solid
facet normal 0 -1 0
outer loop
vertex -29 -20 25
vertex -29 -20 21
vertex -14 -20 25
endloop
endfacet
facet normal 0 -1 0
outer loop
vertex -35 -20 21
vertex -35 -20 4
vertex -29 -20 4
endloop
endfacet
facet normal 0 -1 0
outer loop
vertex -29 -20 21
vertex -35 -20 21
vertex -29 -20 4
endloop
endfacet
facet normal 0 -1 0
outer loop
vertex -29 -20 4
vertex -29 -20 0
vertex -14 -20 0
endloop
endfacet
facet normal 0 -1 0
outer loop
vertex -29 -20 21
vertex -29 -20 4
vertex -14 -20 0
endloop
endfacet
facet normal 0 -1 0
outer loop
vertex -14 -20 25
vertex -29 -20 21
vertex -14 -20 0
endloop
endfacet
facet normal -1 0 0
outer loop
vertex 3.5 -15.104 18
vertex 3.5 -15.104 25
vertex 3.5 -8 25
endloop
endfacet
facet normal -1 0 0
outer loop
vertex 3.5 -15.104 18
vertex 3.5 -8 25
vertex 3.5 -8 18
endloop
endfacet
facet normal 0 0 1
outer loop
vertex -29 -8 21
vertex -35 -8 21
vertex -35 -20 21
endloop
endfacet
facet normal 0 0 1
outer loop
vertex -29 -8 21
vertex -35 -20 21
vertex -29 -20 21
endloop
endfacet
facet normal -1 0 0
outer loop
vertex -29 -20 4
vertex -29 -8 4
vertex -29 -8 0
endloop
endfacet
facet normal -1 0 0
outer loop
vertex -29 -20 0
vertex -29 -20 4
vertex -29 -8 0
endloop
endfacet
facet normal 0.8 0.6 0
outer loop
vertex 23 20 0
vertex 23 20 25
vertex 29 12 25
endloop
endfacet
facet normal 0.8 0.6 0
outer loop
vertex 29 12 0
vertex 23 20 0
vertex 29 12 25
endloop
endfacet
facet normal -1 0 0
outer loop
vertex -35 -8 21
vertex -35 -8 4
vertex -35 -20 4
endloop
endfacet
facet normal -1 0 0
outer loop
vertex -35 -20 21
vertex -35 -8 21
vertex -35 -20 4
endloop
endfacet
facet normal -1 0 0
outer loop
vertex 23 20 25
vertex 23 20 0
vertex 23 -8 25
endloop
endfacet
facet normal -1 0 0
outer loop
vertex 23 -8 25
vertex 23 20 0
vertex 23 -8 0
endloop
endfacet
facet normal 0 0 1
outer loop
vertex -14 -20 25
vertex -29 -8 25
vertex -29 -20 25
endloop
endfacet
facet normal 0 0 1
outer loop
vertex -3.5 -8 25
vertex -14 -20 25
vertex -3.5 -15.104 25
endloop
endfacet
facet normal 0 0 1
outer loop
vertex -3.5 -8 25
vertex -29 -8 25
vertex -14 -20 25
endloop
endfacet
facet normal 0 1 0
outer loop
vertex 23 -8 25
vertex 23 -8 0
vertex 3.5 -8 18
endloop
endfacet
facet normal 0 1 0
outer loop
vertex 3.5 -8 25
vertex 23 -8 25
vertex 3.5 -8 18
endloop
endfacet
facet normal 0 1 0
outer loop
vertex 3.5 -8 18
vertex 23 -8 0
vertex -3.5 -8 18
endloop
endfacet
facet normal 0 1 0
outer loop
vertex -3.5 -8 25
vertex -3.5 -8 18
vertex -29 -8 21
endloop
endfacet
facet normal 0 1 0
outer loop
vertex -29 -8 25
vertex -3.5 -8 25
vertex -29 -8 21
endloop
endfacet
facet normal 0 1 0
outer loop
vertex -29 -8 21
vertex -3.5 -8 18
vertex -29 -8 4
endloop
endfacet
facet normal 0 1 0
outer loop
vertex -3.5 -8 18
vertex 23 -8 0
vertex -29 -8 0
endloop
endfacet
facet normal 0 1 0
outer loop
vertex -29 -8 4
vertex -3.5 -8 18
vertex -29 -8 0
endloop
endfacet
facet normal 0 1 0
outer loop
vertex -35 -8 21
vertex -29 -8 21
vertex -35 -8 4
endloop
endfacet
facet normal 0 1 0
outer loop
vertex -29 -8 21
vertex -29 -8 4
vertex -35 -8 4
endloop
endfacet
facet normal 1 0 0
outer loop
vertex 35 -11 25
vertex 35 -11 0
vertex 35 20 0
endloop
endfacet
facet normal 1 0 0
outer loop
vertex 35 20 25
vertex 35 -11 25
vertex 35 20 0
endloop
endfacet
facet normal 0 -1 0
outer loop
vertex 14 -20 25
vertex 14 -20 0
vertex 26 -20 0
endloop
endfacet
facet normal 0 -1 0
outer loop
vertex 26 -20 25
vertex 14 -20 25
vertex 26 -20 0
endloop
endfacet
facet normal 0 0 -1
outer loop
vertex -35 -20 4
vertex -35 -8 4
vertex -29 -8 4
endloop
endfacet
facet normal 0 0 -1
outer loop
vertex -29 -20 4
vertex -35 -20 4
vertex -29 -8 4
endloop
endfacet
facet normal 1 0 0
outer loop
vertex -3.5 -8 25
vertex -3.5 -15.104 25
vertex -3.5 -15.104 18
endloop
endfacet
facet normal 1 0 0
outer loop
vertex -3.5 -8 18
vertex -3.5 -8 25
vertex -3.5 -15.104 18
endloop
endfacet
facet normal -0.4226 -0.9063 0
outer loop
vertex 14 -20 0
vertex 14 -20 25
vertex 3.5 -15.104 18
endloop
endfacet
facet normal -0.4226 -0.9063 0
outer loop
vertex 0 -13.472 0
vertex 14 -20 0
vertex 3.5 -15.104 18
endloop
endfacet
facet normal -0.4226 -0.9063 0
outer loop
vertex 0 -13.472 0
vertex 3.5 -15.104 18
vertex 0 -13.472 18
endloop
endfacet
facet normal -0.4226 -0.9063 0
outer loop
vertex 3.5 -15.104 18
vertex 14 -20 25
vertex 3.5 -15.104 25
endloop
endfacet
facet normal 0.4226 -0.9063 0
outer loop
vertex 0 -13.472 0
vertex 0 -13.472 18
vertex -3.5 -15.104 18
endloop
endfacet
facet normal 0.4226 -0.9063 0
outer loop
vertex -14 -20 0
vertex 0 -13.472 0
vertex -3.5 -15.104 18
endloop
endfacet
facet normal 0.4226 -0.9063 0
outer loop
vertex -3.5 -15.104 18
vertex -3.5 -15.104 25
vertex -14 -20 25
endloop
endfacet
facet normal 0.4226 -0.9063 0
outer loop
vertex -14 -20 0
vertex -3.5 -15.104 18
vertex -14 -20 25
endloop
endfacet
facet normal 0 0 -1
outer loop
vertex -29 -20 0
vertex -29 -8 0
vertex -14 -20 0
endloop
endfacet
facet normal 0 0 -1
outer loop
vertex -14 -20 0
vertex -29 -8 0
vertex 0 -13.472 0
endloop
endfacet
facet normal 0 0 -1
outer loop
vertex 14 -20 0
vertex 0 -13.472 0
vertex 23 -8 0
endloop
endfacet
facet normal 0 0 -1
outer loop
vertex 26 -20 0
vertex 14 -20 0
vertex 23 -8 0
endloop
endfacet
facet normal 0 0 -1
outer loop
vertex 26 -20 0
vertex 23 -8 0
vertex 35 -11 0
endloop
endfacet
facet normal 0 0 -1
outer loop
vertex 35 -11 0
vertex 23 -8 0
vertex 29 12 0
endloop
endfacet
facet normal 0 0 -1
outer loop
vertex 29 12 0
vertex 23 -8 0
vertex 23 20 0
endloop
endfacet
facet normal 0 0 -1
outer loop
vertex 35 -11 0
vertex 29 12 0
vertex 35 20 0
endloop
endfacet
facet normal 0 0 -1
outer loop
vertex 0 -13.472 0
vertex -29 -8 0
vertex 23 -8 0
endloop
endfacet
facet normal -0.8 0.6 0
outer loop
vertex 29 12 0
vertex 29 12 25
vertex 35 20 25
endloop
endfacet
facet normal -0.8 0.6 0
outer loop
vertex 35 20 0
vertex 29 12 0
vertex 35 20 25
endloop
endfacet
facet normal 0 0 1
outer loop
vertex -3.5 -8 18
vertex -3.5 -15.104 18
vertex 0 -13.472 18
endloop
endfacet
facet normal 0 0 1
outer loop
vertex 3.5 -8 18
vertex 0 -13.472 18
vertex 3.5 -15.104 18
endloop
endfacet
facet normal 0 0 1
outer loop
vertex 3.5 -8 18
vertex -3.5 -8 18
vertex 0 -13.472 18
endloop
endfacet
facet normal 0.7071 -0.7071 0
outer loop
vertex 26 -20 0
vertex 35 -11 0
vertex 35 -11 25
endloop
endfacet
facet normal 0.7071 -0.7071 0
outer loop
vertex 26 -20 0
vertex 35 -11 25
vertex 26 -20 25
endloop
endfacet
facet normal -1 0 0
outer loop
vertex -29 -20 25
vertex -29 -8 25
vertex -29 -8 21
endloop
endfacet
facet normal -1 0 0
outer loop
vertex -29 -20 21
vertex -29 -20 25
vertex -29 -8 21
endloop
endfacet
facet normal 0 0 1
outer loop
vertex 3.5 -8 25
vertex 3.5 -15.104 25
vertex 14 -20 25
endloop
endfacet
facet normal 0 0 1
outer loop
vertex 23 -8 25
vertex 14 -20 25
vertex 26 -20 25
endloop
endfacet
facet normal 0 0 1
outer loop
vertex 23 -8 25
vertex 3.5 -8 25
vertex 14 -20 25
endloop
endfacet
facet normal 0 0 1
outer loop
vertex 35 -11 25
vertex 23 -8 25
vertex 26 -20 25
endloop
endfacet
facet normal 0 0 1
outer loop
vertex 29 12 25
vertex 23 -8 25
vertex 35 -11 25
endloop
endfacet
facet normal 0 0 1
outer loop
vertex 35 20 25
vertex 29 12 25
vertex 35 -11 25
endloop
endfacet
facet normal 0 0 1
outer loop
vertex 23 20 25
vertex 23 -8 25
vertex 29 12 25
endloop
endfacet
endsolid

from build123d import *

# Parameters (mm, degrees)
EXTRUDE_1_DEPTH     = 25
CUT_EXTRUDE_1_DEPTH = 48.434164903
SKETCH_3_W          = 6
SKETCH_3_H          = 4
SKETCH_3_W_2        = 7
SKETCH_3_H_2        = 7
CUT_EXTRUDE_2_DEPTH = 52.322509681


with BuildPart() as part:
    # Эскиз1 → Бобышка-Вытянуть1 (new body)
    with BuildSketch(Plane.XY):
        Polygon((23, -8), (-35, -8), (-35, -20), (35, -20), (35, 20), (23, 20), align=None)
    extrude(amount=EXTRUDE_1_DEPTH)

    # Эскиз2 → Вырез-Вытянуть1 (cut, through all)
    with BuildSketch(Plane.XY.offset(25)):
        Polygon((35, -20), (35, -11), (26, -20), align=None)
        Polygon((-14, -20), (14, -20), (0, -13.471692786), align=None)
        Polygon((23, 20), (29, 12), (35, 20), align=None)
    extrude(amount=-CUT_EXTRUDE_1_DEPTH, mode=Mode.SUBTRACT)

    # Эскиз3 → Вырез-Вытянуть2 (cut, through all)
    with BuildSketch(Plane(origin=(0, -8, 0), x_dir=(1, 0, 0), z_dir=(0, 1, 0))):
        with Locations((-32, -23)):
            Rectangle(SKETCH_3_W, SKETCH_3_H)
        with Locations((-32, -2)):
            Rectangle(SKETCH_3_W, SKETCH_3_H)
        with Locations((0, -21.5)):
            Rectangle(SKETCH_3_W_2, SKETCH_3_H_2)
    extrude(amount=-CUT_EXTRUDE_2_DEPTH, mode=Mode.SUBTRACT)


solid = part.part
